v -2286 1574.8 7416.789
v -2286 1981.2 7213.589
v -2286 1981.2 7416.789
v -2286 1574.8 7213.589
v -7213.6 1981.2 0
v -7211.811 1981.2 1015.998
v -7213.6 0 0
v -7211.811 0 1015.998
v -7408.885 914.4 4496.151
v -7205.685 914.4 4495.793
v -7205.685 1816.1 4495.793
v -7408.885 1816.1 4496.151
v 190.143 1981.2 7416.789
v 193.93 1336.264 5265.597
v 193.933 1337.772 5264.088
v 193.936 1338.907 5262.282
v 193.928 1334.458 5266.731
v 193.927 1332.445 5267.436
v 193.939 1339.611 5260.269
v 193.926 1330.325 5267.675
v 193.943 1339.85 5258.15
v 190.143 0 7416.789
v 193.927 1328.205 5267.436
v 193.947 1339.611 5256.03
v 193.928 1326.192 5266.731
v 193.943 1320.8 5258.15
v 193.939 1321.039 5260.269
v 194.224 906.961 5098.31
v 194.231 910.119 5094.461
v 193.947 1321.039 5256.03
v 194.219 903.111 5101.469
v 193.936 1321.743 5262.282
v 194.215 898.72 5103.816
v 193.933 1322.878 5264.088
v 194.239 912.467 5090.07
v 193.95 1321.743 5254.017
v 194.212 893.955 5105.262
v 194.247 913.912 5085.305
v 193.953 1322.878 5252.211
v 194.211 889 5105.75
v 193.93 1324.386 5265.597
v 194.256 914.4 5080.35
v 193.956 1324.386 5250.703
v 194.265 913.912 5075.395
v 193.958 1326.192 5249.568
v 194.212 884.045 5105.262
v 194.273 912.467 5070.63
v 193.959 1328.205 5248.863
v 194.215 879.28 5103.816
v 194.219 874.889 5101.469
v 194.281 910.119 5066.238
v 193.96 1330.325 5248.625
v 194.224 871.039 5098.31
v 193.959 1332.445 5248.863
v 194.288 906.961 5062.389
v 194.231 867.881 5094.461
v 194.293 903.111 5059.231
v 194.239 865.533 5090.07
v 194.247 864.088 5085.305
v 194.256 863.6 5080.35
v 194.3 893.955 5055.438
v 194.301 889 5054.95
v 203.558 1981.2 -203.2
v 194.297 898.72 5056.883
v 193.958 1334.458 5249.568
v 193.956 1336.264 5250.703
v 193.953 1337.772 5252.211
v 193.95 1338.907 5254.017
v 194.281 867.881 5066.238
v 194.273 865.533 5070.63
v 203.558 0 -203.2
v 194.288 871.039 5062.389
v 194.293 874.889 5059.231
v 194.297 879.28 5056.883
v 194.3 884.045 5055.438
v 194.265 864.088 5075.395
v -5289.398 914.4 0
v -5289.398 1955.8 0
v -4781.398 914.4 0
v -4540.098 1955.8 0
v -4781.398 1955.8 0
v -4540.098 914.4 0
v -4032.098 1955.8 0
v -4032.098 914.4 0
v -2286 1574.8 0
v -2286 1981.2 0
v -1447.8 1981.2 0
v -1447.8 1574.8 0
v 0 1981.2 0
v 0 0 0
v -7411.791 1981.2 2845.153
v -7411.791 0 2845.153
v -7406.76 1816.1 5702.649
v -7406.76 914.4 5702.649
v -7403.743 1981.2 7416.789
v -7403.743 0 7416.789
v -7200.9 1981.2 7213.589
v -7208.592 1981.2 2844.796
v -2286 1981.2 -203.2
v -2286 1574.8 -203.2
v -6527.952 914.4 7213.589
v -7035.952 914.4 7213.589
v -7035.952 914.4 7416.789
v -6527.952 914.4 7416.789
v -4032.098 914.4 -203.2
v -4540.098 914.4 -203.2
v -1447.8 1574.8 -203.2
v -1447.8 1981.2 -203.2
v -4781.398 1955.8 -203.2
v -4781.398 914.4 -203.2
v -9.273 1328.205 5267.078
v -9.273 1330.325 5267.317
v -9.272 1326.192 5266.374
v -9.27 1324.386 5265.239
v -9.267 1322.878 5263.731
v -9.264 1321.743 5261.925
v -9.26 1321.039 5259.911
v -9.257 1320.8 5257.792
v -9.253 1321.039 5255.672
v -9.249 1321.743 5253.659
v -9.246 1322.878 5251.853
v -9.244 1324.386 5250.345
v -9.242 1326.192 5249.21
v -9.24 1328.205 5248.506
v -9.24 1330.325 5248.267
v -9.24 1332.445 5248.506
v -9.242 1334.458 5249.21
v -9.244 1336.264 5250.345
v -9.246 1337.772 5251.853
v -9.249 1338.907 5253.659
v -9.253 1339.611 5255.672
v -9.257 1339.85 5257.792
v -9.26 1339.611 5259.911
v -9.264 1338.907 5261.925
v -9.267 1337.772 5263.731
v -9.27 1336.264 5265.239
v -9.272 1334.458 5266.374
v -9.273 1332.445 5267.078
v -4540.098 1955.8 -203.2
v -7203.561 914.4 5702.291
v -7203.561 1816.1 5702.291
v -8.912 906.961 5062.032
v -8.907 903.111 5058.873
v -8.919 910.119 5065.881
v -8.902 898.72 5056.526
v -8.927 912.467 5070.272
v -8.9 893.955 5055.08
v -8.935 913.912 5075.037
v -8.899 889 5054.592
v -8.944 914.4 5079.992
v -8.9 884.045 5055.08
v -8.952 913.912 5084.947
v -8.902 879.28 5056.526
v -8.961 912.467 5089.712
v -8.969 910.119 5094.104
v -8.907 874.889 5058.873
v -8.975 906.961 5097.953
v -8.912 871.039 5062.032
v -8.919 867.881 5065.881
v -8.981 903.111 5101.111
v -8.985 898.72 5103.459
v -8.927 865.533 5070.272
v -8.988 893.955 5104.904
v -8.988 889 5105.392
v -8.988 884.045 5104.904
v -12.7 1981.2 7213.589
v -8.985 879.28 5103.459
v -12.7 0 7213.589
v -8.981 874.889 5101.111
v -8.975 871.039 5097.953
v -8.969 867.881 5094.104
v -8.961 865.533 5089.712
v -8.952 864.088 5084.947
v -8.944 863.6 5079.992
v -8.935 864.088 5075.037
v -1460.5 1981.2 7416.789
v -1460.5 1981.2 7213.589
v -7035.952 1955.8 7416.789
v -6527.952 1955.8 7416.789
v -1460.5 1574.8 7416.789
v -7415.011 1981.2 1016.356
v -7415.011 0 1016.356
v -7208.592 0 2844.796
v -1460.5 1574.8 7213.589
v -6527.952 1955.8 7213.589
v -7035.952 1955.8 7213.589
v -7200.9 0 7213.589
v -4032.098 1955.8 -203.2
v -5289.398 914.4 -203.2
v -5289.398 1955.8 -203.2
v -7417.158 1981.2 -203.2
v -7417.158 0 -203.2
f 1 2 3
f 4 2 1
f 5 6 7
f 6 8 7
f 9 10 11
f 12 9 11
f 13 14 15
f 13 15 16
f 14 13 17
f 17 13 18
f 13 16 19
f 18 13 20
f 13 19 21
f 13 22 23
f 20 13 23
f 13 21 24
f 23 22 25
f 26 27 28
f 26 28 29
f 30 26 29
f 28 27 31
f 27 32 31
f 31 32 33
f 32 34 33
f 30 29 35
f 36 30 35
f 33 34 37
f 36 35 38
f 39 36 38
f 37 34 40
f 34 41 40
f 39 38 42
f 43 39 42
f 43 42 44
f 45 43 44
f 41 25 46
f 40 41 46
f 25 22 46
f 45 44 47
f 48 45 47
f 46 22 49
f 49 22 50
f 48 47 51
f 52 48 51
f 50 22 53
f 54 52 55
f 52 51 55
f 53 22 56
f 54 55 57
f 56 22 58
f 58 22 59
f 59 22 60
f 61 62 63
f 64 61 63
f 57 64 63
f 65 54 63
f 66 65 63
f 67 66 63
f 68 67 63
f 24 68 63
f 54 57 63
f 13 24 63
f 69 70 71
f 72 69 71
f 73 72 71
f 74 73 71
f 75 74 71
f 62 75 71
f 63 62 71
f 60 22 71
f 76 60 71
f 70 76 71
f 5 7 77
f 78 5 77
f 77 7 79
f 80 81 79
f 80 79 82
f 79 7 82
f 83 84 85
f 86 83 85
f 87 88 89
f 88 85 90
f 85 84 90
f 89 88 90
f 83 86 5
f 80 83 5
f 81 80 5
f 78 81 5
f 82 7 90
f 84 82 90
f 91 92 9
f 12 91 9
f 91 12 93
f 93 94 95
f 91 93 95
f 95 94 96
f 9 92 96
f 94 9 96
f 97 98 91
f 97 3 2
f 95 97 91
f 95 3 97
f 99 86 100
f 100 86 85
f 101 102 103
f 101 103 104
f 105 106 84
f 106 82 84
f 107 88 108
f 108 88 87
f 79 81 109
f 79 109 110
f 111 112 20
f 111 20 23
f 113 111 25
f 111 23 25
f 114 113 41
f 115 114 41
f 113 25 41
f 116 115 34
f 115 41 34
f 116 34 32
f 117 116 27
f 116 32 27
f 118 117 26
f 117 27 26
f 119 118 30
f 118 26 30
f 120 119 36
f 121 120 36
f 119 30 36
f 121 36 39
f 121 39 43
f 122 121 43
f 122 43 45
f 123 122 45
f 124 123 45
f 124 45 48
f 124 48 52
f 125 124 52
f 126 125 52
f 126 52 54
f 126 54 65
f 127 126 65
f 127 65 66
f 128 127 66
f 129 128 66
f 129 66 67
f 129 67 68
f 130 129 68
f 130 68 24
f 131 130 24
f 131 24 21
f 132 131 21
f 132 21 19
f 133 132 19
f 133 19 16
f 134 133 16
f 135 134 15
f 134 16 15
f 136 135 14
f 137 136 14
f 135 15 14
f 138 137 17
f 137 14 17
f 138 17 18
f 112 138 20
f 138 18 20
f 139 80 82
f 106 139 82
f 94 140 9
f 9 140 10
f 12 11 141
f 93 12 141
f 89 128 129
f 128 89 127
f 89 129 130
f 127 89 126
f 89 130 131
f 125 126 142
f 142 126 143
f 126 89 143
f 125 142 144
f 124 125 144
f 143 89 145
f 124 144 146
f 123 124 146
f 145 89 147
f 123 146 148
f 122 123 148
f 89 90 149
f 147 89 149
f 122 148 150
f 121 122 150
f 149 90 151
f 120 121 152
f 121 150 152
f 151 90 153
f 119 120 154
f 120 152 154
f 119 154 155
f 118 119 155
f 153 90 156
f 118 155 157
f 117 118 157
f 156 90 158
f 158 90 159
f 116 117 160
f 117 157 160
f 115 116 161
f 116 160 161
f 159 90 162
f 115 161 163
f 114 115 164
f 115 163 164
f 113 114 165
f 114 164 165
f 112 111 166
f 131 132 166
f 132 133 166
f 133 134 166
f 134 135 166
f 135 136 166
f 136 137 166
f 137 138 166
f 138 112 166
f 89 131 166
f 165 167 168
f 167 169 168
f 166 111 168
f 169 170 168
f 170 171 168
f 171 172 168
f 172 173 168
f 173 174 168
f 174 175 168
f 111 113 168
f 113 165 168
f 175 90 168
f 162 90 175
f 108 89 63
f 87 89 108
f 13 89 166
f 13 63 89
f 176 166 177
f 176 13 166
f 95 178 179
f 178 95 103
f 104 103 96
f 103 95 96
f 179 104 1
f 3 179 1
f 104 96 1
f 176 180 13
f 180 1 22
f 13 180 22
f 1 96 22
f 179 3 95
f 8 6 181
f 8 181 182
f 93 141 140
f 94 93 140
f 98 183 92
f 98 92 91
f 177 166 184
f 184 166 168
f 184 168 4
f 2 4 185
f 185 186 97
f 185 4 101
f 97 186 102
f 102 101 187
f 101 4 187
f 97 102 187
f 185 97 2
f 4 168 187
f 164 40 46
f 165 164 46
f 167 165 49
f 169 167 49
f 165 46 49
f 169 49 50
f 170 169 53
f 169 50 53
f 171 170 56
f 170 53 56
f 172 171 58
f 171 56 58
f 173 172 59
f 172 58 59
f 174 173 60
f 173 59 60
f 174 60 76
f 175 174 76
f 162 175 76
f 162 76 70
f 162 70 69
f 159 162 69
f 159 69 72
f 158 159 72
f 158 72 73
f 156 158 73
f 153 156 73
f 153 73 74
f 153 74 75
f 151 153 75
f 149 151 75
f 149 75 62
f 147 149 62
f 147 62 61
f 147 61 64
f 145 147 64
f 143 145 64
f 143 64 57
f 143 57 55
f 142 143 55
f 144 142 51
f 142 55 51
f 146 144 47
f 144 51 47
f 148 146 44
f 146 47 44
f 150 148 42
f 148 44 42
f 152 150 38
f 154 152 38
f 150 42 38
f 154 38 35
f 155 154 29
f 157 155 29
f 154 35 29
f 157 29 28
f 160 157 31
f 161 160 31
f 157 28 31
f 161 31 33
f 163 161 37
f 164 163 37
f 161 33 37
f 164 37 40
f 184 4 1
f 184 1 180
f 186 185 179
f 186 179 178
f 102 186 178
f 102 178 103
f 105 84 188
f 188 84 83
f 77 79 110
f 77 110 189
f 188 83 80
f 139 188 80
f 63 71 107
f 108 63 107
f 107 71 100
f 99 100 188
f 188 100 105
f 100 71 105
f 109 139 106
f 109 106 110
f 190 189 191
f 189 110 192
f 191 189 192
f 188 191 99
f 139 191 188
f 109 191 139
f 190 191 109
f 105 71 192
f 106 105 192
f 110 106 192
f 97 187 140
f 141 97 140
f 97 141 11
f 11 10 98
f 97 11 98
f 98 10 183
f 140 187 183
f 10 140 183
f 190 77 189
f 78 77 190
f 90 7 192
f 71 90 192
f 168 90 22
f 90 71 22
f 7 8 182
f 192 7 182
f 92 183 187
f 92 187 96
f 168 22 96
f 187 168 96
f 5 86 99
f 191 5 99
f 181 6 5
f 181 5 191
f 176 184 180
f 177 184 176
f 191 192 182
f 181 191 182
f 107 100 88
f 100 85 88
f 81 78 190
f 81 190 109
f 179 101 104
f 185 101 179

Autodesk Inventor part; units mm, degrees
ref_plane "YZ Plane" through (0, 0, 0) normal (1, 0, 0) x (0, 1, 0)
ref_plane "XZ Plane" through (0, 0, 0) normal (0, 1, 0) x (-1, 0, 0)
ref_plane "XY Plane" through (0, 0, 0) normal (0, 0, 1) x (1, 0, 0)
sketch "Sketch1" plane through (0, 0, 0) normal (0, 1, 0) x (-1, 0, 0)
  line L0 (0, 0) -> (12.7, 7213.5888)
  line L1 (12.7, 7213.5888) -> (7200.9, 7213.5888)
  line L2 (7200.9, 7213.5888) -> (7213.6, 0)
  line L3 (7213.6, 0) -> (0, 0)
  line L4 (7403.7426, 7416.7888) -> (-190.1426, 7416.7888)
  line L5 (-190.1426, 7416.7888) -> (-203.5581, -203.2)
  line L6 (-203.5581, -203.2) -> (7417.1581, -203.2)
  line L7 (7417.1581, -203.2) -> (7403.7426, 7416.7888)
  dimension "d1" = 7188.2
  dimension "d3" = 12.7
  dimension "d4" = 7213.6
  dimension "d5" = 7213.6
  dimension "d6" = 203.2
  dimension "d8" = 7213.6
extrude "Extrusion1" add sketch "Sketch1" along normal blind 1981.2
sketch "Sketch3" plane through (-12.7, 0, 7213.5888) normal (0, 0, -1) x (-1, 0, 0)
  line L0 (7391.0426, 1981.2) -> (-202.8426, 1981.2) projected
  line L1 (2273.3, 1981.2) -> (2273.3, 1574.8)
  line L2 (2273.3, 1574.8) -> (1447.8, 1574.8)
  line L3 (1447.8, 1574.8) -> (1447.8, 1981.2)
  line L4 (0, 0) -> (0, 1981.2) projected
  line L5 (0, 0) -> (7188.2, 0) projected
  line L6 (1447.8, 1981.2) -> (2273.3, 1981.2)
  point P0 (-12.7, 0)
  dimension "d20" = 1447.8
  dimension "d23" = 406.4
  dimension "d24" = 825.5
extrude "Extrusion2" cut sketch "Sketch3" against normal up to surface (203.2 mm away)
sketch "Sketch4" plane through (-12.7, 0, 7213.5888) normal (-0.9999985, 0, -0.0017606) x (-0.0017606, 0, 0.9999985)
  line L0 (-7213.6, 0) -> (0, 0) projected
  line L1 (-7213.6, 0) -> (-7213.6, 1981.2) projected
  point P0 (-1955.8, 1330.325)
  dimension "d27" = 1330.325
  dimension "d28" = 5257.8
hole "Hole1" at (-9.2567, 1330.325, 5257.7919) direction (0.9999985, 0, 0.0017606) diameter 19.05 end through all
sketch "Sketch5" plane through (-12.7, 0, 7213.5888) normal (-0.9999985, 0, -0.0017606) x (-0.0017606, 0, 0.9999985)
  line L0 (-7213.6, 0) -> (0, 0) projected
  line L1 (-7213.6, 0) -> (-7213.6, 1981.2) projected
  point P0 (-2133.6, 889)
  dimension "d36" = 889
  dimension "d37" = 5080
hole "Hole2" at (-8.9437, 889, 5079.9921) direction (0.9999985, 0, 0.0017606) diameter 50.8 end through all
sketch "Sketch6" plane through (-7213.6, 0, 0) normal (0, 0, 1) x (1, 0, 0)
  line L0 (7417.1581, 1981.2) -> (-203.5581, 1981.2) projected
  line L1 (5765.8, 1981.2) -> (4927.6, 1981.2)
  line L2 (4927.6, 1981.2) -> (4927.6, 1574.8)
  line L3 (4927.6, 1574.8) -> (5765.8, 1574.8)
  line L4 (5765.8, 1574.8) -> (5765.8, 1981.2)
  line L5 (7213.6, 0) -> (7213.6, 1981.2) projected
  line L6 (0, 0) -> (7213.6, 0) projected
  dimension "d45" = 1447.8
  dimension "d47" = 406.4
  dimension "d48" = 838.2
extrude "Extrusion3" cut sketch "Sketch6" against normal up to surface (203.2 mm away)
sketch "Sketch7" plane through (-7213.6, 0, 0) normal (0.9999985, 0, -0.0017606) x (-0.0017606, 0, -0.9999985)
  line L0 (-7213.6, 0) -> (0, 0) projected
  line L1 (-1016, 0) -> (-2844.8, 0)
  line L2 (-2844.8, 0) -> (-2844.8, 2006.6)
  line L3 (-2844.8, 2006.6) -> (-1016, 2006.6)
  line L4 (-1016, 2006.6) -> (-1016, 0)
  line L5 (0, 0) -> (0, 1981.2) projected
  point P0 (-12.7, 0)
  point P1 (-2844.8, 0)
  dimension "d51" = 1016
  dimension "d52" = 2006.6
  dimension "d53" = 1828.8
extrude "Extrusion4" cut sketch "Sketch7" against normal up to surface (203.2 mm away)
sketch "Sketch8" plane through (-7200.9, 0, 7213.5888) normal (0.9999985, 0, -0.0017606) x (-0.0017606, 0, -0.9999985)
  line L0 (2717.8, 1816.1) -> (1511.3, 1816.1)
  line L1 (1511.3, 1816.1) -> (1511.3, 914.4)
  line L2 (1511.3, 914.4) -> (2717.8, 914.4)
  line L3 (2717.8, 914.4) -> (2717.8, 1816.1)
  line L4 (0, 0) -> (0, 1981.2) projected
  line L5 (0, 0) -> (4368.8, 0) projected
  point P0 (7200.9, 0)
  dimension "d56" = 2717.8
  dimension "d57" = 1206.5
  dimension "d58" = 901.7
  dimension "d59" = 914.4
extrude "Extrusion5" cut sketch "Sketch8" against normal up to surface (203.2 mm away)
sketch "Sketch9" plane through (-7213.6, 0, 0) normal (0, 0, 1) x (1, 0, 0)
  line L0 (3181.5024, 1955.8) -> (2673.5024, 1955.8)
  line L1 (2673.5024, 1955.8) -> (2673.5024, 914.4)
  line L2 (2673.5024, 914.4) -> (3181.5024, 914.4)
  line L3 (3181.5024, 914.4) -> (3181.5024, 1955.8)
  line L4 (0, 0) -> (7213.6, 0) projected
  line L5 (7213.6, 0) -> (7213.6, 1981.2) projected
  dimension "d63" = 1041.4
  dimension "d64" = 508
  dimension "d65" = 914.4
  dimension "d66" = 4540.0976
extrude "Extrusion6" cut sketch "Sketch9" against normal up to surface (203.2 mm away)
sketch "Sketch10" plane through (-7213.6, 0, 0) normal (0, 0, 1) x (1, 0, 0)
  line L0 (2432.2024, 914.4) -> (1924.2024, 914.4)
  line L1 (1924.2024, 914.4) -> (1924.2024, 1955.8)
  line L2 (1924.2024, 1955.8) -> (2432.2024, 1955.8)
  line L3 (2432.2024, 1955.8) -> (2432.2024, 914.4)
  line L4 (0, 0) -> (7213.6, 0) projected
  line L5 (0, 0) -> (0, 1981.2) projected
  dimension "d69" = 914.4
  dimension "d70" = 1041.4
  dimension "d71" = 508
  dimension "d72" = 1924.2024
extrude "Extrusion7" cut sketch "Sketch10" against normal up to surface (203.2 mm away)
sketch "Sketch11" plane through (-12.7, 0, 7213.5888) normal (0, 0, -1) x (-1, 0, 0)
  line L0 (7023.2524, 914.4) -> (6515.2524, 914.4)
  line L1 (6515.2524, 914.4) -> (6515.2524, 1955.8)
  line L2 (6515.2524, 1955.8) -> (7023.2524, 1955.8)
  line L3 (7023.2524, 1955.8) -> (7023.2524, 914.4)
  line L4 (7188.2, 0) -> (7188.2, 1981.2) projected
  line L5 (0, 0) -> (7188.2, 0) projected
  point P0 (-12.7, 0)
  dimension "d75" = 164.9476
  dimension "d76" = 1041.4
  dimension "d79" = 508
  dimension "d80" = 914.4
extrude "Extrusion8" cut sketch "Sketch11" against normal up to surface (203.2 mm away)
properties part number "Exterior_Walls" material "Concrete"
